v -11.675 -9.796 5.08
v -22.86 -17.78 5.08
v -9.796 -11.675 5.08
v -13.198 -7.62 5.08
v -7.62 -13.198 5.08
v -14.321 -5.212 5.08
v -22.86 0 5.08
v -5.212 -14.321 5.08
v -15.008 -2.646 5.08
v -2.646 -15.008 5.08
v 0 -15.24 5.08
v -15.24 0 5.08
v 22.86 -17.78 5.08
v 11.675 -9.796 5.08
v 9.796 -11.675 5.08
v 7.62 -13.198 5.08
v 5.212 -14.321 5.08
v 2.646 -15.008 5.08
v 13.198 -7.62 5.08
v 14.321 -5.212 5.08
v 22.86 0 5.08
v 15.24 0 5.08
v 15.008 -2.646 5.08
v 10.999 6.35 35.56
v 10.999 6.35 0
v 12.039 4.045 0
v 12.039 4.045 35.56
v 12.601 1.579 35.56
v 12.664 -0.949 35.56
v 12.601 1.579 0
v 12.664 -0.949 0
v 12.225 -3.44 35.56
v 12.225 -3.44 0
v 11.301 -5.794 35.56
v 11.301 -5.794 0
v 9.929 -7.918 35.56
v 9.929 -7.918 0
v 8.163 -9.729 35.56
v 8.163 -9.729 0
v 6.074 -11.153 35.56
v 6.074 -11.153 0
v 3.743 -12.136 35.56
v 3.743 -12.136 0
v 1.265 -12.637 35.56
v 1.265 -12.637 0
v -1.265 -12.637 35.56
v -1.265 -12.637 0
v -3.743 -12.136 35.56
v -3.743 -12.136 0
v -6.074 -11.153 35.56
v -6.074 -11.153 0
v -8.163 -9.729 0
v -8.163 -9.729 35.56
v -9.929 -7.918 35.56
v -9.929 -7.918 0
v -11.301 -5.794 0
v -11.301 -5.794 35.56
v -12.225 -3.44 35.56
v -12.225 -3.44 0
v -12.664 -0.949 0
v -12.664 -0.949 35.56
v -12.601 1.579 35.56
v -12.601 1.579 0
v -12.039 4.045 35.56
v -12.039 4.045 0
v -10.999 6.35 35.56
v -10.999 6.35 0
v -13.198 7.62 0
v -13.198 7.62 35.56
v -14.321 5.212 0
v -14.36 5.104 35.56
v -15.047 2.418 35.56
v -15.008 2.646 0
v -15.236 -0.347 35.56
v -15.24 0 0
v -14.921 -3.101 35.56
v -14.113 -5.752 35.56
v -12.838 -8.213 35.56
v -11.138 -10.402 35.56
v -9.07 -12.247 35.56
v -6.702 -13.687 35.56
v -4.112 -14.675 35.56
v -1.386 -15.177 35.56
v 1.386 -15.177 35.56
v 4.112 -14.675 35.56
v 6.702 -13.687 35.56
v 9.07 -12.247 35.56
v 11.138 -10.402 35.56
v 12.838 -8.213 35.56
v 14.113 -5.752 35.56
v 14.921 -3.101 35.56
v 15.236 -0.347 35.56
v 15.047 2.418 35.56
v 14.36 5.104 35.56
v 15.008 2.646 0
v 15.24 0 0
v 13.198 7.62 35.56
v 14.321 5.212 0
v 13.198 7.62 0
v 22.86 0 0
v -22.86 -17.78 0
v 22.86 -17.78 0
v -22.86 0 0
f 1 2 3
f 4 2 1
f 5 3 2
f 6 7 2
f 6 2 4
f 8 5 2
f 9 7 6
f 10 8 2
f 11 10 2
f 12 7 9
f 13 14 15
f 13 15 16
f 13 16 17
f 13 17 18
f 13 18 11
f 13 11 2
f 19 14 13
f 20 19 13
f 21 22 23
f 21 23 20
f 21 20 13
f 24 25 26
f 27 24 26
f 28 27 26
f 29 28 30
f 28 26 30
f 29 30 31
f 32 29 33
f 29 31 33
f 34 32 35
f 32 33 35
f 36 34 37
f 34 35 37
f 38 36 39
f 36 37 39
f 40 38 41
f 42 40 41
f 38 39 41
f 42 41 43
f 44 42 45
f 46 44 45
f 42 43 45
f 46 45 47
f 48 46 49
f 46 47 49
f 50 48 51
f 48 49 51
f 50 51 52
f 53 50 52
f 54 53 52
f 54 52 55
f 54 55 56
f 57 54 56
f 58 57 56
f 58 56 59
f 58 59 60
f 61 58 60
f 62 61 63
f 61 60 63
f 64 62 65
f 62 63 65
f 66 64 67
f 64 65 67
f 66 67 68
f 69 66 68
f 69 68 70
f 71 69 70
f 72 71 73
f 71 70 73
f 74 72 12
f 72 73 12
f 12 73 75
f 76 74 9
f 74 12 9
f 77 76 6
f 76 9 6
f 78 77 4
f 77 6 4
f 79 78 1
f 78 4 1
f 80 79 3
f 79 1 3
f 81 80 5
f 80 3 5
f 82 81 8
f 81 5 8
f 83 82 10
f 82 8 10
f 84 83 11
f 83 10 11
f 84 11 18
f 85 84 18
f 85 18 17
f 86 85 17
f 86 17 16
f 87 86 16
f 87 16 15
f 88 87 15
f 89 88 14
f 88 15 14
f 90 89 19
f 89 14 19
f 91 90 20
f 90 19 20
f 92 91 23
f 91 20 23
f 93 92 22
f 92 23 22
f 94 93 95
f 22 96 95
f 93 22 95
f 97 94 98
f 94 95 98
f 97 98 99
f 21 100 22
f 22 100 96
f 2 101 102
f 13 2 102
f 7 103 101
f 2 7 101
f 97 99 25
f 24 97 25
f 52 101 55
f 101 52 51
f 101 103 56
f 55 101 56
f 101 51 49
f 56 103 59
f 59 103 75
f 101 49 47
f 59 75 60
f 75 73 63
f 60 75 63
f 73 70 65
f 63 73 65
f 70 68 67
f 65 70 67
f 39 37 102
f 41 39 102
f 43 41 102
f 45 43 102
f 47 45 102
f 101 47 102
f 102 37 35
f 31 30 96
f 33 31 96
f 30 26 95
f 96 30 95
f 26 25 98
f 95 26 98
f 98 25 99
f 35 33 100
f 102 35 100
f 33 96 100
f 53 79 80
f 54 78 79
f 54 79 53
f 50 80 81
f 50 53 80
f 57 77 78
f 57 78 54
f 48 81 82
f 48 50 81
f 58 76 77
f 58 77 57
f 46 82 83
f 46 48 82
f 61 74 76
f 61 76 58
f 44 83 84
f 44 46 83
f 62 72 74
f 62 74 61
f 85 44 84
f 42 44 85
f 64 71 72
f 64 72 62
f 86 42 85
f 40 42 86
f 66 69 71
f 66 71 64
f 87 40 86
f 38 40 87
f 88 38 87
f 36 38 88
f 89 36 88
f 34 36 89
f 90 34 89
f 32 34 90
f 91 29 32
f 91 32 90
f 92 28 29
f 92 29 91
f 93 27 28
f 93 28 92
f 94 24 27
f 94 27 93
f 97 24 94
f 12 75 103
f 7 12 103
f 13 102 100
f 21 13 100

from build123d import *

# Parameters (mm, degrees)
F1_DEPTH = 35.56
F3_DEPTH = 5.08


with BuildPart() as f1:
    # F0 (on Top) → F1 (new body)
    with BuildSketch(Plane.XY):
        with BuildLine():
            ThreePointArc((10.998523, 6.35), (0, -12.7), (-10.998523, 6.35))
            Line((-10.998523, 6.35), (-13.198227, 7.62))
            ThreePointArc((-13.198227, 7.62), (0, -15.24), (13.198227, 7.62))
            Line((13.198227, 7.62), (10.998523, 6.35))
        make_face()
    extrude(amount=F1_DEPTH)

    # F2 (on Top) → F3 (join)
    with BuildSketch(Plane.XY):
        with BuildLine():
            Line((22.86, 0), (15.24, 0))
            ThreePointArc((15.24, 0), (0, -15.24), (-15.24, 0))
            Line((-15.24, 0), (-22.86, 0))
            Line((-22.86, 0), (-22.86, -17.78))
            Line((-22.86, -17.78), (0, -17.78))
            Line((0, -17.78), (22.86, -17.78))
            Line((22.86, -17.78), (22.86, 0))
        make_face()
    extrude(amount=F3_DEPTH)


solid = f1.part
